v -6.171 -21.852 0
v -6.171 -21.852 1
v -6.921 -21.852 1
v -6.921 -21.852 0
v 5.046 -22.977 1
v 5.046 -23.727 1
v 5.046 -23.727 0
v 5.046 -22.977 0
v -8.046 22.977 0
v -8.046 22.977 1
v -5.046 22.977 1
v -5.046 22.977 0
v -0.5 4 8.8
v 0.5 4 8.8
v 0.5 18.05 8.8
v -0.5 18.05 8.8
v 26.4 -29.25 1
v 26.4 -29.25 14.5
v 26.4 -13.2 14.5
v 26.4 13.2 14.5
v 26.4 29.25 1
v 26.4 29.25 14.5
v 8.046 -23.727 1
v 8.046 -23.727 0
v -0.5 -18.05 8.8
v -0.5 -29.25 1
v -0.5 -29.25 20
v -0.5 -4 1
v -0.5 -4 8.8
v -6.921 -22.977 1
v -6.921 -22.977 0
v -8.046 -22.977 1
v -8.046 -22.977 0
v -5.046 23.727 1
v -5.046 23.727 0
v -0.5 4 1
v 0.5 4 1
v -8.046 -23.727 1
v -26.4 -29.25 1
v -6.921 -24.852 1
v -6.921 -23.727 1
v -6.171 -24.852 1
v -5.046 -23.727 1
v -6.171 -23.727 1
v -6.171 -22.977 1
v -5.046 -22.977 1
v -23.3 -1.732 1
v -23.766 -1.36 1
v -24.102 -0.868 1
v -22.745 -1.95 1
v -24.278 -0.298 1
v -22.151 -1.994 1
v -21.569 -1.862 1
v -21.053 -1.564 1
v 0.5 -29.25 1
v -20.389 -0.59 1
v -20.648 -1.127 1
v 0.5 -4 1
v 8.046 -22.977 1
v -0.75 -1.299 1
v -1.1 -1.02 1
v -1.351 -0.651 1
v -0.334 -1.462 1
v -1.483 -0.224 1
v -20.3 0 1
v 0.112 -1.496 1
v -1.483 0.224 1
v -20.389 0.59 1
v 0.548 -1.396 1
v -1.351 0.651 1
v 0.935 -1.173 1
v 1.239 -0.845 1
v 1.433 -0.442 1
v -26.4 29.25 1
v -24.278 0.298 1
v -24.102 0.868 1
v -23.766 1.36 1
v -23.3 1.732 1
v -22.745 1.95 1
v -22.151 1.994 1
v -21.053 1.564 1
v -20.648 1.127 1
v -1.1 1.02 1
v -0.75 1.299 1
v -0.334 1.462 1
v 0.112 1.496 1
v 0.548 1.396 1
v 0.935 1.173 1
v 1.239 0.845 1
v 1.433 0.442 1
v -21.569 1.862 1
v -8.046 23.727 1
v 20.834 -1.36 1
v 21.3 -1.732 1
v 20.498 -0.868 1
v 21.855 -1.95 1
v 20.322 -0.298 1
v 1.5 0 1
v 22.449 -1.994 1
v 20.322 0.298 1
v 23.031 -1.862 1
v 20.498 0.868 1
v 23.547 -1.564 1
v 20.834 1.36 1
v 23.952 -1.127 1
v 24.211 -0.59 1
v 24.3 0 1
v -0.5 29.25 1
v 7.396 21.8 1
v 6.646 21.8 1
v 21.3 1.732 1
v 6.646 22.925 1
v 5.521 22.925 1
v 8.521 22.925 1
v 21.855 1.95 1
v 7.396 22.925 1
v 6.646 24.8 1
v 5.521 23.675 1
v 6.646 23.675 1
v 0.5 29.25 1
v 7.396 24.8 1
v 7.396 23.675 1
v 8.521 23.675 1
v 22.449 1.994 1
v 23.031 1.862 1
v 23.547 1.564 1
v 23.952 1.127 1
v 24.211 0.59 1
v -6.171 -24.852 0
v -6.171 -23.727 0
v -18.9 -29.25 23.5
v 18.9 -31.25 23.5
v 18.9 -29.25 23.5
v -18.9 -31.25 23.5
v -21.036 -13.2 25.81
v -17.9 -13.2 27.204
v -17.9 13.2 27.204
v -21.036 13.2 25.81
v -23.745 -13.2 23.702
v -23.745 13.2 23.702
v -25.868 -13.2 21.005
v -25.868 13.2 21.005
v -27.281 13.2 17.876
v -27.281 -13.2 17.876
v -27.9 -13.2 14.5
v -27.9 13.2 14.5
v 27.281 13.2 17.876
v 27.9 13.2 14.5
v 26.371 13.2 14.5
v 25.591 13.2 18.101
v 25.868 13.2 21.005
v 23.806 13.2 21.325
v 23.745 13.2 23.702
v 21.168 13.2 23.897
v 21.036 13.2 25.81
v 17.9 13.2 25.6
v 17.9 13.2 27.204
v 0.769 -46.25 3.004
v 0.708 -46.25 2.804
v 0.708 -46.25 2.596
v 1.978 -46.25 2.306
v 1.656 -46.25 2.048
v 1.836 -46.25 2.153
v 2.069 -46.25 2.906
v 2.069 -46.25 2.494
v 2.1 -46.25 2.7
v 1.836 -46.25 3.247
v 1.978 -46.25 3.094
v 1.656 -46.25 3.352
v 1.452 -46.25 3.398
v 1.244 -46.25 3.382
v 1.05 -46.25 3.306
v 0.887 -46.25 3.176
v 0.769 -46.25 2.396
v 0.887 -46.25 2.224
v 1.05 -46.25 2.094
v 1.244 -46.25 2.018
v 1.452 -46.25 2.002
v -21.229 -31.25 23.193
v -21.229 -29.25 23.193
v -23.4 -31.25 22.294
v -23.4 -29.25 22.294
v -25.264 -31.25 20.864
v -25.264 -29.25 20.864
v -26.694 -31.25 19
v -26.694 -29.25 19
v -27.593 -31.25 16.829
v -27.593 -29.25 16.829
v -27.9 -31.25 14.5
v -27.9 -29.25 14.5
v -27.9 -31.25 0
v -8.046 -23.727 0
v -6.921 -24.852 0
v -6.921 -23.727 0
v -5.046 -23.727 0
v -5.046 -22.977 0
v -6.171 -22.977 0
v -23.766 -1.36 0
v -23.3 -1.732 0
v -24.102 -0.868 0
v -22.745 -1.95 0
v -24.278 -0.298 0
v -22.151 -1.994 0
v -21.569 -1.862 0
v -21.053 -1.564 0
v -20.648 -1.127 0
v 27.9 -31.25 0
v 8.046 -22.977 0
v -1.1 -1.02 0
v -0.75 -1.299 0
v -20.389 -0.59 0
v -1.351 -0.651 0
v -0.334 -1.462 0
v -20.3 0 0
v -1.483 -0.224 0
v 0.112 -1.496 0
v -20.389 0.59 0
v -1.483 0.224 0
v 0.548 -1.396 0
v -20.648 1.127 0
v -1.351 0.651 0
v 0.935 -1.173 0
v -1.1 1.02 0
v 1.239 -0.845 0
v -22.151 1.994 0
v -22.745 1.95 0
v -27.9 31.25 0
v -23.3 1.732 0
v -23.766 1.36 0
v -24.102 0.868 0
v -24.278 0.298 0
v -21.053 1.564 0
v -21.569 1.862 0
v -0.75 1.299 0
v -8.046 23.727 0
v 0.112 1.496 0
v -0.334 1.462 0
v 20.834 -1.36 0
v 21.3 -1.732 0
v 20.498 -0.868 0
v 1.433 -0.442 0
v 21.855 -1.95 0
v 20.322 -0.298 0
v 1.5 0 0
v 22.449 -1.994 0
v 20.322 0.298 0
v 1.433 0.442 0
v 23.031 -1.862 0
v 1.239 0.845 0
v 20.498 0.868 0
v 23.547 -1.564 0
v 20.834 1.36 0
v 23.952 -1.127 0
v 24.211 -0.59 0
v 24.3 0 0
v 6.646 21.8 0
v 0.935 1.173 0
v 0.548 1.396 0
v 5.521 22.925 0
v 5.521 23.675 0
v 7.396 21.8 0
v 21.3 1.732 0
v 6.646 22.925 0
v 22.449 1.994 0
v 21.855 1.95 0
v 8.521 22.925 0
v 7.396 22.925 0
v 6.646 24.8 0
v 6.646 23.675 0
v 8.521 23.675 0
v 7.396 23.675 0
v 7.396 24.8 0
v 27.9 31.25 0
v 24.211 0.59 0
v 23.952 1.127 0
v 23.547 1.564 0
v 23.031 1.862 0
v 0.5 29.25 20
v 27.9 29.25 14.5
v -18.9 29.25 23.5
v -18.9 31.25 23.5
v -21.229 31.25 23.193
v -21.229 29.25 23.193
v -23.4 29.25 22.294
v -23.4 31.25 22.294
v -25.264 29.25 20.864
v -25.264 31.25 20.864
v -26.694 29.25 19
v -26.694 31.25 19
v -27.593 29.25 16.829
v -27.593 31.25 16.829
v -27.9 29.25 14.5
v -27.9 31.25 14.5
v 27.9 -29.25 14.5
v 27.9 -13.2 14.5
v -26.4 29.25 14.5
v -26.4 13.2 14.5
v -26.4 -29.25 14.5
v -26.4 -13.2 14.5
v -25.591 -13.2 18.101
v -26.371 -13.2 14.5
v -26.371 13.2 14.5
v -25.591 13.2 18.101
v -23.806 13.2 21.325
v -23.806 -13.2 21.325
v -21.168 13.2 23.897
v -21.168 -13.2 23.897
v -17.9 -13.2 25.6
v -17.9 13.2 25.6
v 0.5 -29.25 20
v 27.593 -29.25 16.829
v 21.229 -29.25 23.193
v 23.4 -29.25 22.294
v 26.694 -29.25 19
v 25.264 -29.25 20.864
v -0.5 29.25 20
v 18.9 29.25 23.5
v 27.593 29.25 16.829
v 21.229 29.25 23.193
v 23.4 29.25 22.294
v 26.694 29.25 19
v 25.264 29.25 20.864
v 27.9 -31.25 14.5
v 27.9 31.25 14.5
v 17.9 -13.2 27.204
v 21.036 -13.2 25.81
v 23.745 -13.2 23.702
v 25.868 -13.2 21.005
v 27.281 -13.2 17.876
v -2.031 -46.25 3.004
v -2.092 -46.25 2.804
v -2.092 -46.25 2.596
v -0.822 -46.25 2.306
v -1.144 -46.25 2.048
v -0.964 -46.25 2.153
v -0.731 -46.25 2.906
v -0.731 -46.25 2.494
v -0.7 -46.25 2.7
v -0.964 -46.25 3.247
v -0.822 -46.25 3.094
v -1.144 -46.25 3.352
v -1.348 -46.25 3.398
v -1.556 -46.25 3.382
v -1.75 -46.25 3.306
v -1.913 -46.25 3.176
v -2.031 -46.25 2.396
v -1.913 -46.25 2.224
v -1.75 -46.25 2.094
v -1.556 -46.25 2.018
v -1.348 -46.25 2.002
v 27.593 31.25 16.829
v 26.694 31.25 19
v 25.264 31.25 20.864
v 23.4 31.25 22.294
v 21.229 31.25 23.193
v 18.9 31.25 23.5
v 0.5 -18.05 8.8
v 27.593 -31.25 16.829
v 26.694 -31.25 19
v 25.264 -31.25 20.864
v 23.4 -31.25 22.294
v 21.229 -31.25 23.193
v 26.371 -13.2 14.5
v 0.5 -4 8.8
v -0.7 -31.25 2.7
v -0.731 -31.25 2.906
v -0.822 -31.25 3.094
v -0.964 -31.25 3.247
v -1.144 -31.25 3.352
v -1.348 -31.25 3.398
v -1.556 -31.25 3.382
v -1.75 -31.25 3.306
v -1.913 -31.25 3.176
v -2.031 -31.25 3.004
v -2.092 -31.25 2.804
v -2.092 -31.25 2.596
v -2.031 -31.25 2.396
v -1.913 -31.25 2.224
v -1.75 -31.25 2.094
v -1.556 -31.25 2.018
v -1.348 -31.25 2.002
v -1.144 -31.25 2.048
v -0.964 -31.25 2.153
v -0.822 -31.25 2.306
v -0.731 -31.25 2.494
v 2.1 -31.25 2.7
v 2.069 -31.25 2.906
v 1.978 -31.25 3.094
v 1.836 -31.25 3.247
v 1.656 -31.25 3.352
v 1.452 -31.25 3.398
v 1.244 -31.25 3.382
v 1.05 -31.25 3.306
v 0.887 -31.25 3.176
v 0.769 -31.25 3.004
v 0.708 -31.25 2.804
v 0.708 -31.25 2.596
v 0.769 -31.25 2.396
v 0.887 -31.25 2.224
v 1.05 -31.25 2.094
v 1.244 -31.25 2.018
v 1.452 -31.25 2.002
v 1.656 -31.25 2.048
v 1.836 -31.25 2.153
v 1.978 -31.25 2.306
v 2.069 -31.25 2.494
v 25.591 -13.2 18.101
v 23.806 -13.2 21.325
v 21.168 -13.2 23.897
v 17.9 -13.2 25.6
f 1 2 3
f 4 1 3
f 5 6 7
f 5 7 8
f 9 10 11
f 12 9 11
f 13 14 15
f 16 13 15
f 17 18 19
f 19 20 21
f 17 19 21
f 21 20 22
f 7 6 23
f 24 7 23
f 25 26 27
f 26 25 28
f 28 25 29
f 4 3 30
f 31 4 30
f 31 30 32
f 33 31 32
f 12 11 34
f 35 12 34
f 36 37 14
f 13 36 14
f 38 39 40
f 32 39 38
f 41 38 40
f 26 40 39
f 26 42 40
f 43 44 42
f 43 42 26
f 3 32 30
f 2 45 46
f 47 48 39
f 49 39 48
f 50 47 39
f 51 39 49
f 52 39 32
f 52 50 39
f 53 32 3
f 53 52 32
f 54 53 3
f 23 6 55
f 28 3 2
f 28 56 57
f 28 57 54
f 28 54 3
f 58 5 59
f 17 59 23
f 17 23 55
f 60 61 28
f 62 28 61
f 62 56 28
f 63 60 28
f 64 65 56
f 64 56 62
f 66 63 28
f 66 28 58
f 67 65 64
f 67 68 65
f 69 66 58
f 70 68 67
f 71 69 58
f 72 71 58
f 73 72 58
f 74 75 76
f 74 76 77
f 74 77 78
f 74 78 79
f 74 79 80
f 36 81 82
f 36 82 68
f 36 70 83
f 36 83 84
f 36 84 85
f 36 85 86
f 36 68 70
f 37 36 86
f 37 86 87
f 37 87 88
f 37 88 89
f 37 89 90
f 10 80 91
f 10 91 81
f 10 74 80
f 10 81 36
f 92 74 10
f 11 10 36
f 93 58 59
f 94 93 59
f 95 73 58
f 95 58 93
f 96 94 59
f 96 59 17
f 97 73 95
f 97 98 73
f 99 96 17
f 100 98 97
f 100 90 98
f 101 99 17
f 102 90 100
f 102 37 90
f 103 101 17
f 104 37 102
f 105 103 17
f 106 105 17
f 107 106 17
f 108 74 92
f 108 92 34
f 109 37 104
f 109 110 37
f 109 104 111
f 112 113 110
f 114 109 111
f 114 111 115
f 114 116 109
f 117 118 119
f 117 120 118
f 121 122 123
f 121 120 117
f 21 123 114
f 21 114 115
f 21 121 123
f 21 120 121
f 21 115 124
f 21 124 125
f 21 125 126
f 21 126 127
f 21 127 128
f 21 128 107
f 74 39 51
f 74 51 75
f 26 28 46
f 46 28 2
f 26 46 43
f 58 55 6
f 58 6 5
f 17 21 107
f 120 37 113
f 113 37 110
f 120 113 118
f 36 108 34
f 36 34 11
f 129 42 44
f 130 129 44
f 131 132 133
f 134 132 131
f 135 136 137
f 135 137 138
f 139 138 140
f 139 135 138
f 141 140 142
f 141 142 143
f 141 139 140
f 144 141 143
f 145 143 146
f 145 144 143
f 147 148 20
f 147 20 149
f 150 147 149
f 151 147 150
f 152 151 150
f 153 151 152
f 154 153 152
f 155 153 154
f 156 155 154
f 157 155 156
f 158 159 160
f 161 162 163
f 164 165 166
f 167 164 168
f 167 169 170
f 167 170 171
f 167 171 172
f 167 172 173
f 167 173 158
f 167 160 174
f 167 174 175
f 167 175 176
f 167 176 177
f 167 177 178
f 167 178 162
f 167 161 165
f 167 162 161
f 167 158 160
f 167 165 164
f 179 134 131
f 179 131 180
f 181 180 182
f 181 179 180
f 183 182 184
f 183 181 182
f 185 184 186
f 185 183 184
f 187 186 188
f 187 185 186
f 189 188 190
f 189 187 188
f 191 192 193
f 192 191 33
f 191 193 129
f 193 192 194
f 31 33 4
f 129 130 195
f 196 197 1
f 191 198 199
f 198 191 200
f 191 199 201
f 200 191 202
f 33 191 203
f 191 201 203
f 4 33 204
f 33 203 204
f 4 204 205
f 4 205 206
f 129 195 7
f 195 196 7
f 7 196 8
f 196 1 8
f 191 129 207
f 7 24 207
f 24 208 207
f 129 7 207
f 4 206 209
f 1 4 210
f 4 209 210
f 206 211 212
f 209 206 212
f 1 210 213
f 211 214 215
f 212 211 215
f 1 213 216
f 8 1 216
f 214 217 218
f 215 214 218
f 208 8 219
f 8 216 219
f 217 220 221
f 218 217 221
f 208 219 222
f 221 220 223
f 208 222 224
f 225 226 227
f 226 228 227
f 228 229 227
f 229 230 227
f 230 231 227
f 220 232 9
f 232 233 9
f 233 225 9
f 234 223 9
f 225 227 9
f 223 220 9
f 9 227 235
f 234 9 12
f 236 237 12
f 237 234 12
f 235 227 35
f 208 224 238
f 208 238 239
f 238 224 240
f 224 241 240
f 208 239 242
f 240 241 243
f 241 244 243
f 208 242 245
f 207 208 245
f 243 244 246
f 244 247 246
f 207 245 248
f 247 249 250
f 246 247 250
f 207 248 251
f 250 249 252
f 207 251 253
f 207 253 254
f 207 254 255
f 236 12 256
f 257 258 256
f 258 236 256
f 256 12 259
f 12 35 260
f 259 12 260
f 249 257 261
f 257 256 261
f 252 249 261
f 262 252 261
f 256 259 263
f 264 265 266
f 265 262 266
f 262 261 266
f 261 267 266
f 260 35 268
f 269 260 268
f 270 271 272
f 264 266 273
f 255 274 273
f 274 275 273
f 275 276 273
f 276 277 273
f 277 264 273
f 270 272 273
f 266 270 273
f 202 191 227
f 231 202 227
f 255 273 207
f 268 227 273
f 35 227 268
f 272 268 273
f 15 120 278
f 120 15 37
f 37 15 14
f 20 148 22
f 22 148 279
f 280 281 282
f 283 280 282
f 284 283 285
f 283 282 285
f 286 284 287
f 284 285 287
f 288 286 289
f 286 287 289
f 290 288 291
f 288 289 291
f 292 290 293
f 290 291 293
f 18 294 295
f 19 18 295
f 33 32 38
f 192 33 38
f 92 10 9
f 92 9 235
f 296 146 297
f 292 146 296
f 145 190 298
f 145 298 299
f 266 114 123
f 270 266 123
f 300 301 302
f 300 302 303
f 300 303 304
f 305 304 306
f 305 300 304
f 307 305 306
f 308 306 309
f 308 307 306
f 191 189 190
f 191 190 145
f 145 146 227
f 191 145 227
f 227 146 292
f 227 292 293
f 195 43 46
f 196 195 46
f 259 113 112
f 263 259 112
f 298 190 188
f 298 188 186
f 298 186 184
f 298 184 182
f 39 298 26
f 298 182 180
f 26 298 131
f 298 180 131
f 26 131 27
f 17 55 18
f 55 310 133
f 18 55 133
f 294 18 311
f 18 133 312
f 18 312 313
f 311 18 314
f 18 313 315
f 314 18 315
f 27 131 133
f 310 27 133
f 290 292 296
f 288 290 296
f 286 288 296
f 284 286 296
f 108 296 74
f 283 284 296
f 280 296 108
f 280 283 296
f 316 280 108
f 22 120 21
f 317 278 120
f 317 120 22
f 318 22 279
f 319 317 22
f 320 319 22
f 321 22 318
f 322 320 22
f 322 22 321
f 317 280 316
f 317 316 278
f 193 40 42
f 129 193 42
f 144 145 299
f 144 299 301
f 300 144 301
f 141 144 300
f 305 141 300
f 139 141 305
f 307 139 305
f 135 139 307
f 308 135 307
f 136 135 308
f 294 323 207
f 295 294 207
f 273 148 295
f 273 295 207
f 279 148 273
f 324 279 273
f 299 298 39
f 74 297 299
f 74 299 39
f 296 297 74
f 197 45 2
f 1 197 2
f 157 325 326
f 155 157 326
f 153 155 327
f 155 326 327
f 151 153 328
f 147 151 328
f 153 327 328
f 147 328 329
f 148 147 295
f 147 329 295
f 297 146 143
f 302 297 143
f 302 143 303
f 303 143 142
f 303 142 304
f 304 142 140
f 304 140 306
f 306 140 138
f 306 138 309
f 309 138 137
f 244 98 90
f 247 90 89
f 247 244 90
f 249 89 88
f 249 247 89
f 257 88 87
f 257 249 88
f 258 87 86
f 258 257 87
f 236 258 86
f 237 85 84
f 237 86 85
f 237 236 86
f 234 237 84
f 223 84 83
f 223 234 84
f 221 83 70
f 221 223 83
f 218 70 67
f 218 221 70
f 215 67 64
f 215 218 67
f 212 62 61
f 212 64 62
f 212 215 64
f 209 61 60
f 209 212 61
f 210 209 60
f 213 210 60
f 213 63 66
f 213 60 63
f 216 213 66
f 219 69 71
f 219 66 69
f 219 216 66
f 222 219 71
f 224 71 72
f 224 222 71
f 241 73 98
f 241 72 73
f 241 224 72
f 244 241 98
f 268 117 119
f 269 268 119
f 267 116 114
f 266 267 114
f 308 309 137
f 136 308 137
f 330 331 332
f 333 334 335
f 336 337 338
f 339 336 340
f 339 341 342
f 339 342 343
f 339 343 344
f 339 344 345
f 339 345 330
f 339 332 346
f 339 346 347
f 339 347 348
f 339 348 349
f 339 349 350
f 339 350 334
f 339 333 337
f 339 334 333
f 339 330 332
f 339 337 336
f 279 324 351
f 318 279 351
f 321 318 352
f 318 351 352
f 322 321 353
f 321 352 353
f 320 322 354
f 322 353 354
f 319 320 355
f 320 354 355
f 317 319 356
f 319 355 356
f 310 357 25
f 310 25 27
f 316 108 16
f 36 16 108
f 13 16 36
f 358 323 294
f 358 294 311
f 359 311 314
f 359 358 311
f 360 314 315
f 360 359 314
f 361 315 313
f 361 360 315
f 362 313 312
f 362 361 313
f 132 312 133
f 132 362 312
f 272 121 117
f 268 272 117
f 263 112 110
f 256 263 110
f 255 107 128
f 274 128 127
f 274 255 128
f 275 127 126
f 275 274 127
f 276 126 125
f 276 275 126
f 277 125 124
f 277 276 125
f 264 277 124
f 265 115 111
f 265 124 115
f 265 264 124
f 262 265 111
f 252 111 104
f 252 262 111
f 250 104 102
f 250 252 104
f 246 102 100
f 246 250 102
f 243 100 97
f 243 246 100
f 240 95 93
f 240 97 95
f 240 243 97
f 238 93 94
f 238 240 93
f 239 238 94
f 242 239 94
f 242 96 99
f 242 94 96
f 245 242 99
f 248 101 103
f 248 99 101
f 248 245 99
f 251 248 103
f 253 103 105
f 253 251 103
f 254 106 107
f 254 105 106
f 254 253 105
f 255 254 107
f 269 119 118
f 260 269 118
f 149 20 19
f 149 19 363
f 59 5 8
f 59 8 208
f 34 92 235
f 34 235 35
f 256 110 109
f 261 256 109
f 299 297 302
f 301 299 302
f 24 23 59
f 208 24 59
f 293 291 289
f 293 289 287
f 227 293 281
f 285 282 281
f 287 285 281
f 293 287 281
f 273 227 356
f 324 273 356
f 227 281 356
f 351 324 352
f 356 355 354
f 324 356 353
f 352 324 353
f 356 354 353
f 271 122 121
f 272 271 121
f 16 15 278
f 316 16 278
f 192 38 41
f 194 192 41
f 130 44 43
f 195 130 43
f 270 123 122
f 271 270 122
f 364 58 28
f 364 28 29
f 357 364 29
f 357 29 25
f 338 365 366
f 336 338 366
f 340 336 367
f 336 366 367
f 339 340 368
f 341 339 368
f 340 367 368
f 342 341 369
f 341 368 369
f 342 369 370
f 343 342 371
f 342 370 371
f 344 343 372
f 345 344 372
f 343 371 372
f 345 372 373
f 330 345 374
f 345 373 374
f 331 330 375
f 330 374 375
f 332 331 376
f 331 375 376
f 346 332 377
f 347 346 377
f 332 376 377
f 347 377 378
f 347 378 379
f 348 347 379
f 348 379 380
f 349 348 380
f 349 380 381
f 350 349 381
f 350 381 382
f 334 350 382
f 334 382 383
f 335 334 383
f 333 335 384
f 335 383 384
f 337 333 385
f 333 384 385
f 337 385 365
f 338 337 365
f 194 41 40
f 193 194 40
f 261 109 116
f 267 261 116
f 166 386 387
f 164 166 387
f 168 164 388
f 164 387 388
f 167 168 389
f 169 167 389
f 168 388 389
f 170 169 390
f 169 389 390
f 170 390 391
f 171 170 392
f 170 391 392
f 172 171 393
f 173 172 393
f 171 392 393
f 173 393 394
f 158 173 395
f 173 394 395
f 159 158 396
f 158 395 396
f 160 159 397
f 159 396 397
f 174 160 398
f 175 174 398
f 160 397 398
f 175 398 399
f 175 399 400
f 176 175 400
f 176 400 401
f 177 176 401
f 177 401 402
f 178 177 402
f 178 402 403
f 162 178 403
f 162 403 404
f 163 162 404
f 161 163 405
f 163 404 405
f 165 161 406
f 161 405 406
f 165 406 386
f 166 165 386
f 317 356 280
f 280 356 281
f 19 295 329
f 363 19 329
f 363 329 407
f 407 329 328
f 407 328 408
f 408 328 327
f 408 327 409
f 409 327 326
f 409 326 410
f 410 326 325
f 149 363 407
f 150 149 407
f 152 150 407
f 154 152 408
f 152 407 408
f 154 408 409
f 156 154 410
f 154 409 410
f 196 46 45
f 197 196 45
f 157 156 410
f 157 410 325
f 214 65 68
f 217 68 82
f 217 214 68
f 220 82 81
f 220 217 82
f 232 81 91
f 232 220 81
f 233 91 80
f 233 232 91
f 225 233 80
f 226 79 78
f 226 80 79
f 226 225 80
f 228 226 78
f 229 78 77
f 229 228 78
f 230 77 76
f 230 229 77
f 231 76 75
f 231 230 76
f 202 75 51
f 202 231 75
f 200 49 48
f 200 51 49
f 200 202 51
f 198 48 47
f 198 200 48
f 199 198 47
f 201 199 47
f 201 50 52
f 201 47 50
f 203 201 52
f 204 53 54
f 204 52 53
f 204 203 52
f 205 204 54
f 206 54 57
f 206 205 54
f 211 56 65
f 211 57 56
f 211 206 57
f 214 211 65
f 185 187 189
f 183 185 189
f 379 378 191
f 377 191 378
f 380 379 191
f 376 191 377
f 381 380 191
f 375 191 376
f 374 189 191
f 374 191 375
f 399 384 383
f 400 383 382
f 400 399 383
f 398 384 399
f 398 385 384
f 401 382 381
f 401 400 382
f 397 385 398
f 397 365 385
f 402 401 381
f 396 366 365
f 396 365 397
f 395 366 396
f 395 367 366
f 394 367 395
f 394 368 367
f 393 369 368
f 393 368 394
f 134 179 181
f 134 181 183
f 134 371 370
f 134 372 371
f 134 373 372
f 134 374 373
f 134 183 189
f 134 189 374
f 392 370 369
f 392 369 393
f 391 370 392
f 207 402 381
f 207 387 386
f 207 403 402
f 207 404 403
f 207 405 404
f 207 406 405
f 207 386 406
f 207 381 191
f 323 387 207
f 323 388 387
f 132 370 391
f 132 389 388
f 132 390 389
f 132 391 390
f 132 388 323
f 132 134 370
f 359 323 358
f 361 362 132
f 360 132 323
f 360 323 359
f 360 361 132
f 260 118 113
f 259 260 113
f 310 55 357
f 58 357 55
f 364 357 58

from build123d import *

# Parameters (mm, degrees)
F0_W      = 55.8
F0_H      = 62.5
F0_R      = 2
F0_R_2    = 1.5
F1_DEPTH  = 1
F3_DEPTH  = 2
F5_W      = 58.5
F5_H      = 13.5
F6_DEPTH  = 1.5
F10_DEPTH = 1
F14_DEPTH = 26.4
F16_W     = 3
F16_H     = 0.7499982331
F17_DEPTH = 1
F18_R     = 0.7
F19_DEPTH = 15


with BuildPart() as f1:
    # F0 (on Top) → F1 (new body)
    with BuildSketch(Plane.XY):
        Rectangle(F0_W, F0_H)
        with Locations((-22.3, 0)):
            Circle(F0_R, mode=Mode.SUBTRACT)
        Circle(F0_R_2, mode=Mode.SUBTRACT)
        with Locations((22.3, 0)):
            Circle(F0_R, mode=Mode.SUBTRACT)
    extrude(amount=F1_DEPTH)

    # F4: F3 across plane


with BuildPart() as f3:
    # F2 (on face) → F3 (new body)
    with BuildSketch(Plane.XZ.offset(31.25)):
        with BuildLine():
            Line((-27.9, 14.5), (-27.9, 1))
            Line((-27.9, 1), (27.9, 1))
            Line((27.9, 1), (27.9, 14.5))
            ThreePointArc((27.9, 14.5), (25.2639610307, 20.8639610307), (18.9, 23.5))
            Line((18.9, 23.5), (-18.9, 23.5))
            ThreePointArc((-18.9, 23.5), (-25.2639610307, 20.8639610307), (-27.9, 14.5))
        make_face()
    extrude(amount=-F3_DEPTH)


with BuildPart() as f1_1:
    add(f1.part)
    add(f3.part.mirror(Plane.XZ))


    add(f3.part)  # F6 merges F3
    # F5 (on face) → F6 (join)
    with BuildSketch(Plane.YZ.offset(27.9)):
        with Locations((0, 7.75)):
            Rectangle(F5_W, F5_H)
    extrude(amount=-F6_DEPTH)

    # F7: F1 across plane


with BuildPart() as f1_2:
    add(f1_1.part)
    add(f1_1.part.mirror(Plane.YZ))

    # F9 (on offset) → F10 (join)
    with BuildSketch(Plane.YZ.offset(0.5)):
        Polygon((-18.05, 8.8), (-29.25, 20), (-29.25, 0), (-4, 0), (-4, 8.8), align=None)
    extrude(amount=-F10_DEPTH)

    # F11: F1 across plane


with BuildPart() as f1_3:
    add(f1_2.part)
    add(f1_2.part.mirror(Plane.XZ))

    # F13 (on offset) → F14 (join)
    with BuildSketch(Plane.XZ.offset(13.2)):
        with BuildLine():
            Line((-17.9, 25.599895397), (-17.9, 27.204427321))
            ThreePointArc((-17.9, 27.204427321), (-24.8888113544, 22.4176611255), (-27.9, 14.5))
            Line((-27.9, 14.5), (-26.3714103808, 14.5))
            ThreePointArc((-26.3714103808, 14.5), (-23.805942074, 21.3246680061), (-17.9, 25.599895397))
        make_face()
    extrude(amount=-F14_DEPTH)

    # F15: F1 across plane


with BuildPart() as f1_4:
    add(f1_3.part)
    add(f1_3.part.mirror(Plane.YZ))

    # F16 (on face) → F17 (cut)
    with BuildSketch(Plane.XY.offset(1)):
        with Locations((-6.5461898372, 23.3516955865)):
            Rectangle(F16_W, F16_H)
        Polygon((7.3961903043, 22.9248698354), (8.5211903043, 22.9248698354), (8.5211903043, 23.6748680685), (7.3961903043, 23.6748680685), (7.3961903043, 24.7998698354), (6.6461903043, 24.7998698354), (6.6461903043, 23.6748680685), (5.5211903043, 23.6748680685), (5.5211903043, 22.9248698354), (6.6461903043, 22.9248698354), (6.6461903043, 21.7998698354), (7.3961903043, 21.7998698354), align=None)
        with Locations((6.5461898372, -23.3516955865)):
            Rectangle(F16_W, F16_H)
        Polygon((-6.1711898372, -23.7266947031), (-5.0461898372, -23.7266947031), (-5.0461898372, -22.97669647), (-6.1711898372, -22.97669647), (-6.1711898372, -21.8516947031), (-6.9211898372, -21.8516947031), (-6.9211898372, -22.97669647), (-8.0461898372, -22.97669647), (-8.0461898372, -23.7266947031), (-6.9211898372, -23.7266947031), (-6.9211898372, -24.8516947031), (-6.1711898372, -24.8516947031), align=None)
    extrude(amount=-F17_DEPTH, mode=Mode.SUBTRACT)

    # F18 (on face) → F19 (join)
    with BuildSketch(Plane.XZ.offset(31.25)):
        with Locations((-1.4, 2.7)):
            Circle(F18_R)
        with Locations((1.4, 2.7)):
            Circle(F18_R)
    extrude(amount=F19_DEPTH)


solid = f1_4.part
